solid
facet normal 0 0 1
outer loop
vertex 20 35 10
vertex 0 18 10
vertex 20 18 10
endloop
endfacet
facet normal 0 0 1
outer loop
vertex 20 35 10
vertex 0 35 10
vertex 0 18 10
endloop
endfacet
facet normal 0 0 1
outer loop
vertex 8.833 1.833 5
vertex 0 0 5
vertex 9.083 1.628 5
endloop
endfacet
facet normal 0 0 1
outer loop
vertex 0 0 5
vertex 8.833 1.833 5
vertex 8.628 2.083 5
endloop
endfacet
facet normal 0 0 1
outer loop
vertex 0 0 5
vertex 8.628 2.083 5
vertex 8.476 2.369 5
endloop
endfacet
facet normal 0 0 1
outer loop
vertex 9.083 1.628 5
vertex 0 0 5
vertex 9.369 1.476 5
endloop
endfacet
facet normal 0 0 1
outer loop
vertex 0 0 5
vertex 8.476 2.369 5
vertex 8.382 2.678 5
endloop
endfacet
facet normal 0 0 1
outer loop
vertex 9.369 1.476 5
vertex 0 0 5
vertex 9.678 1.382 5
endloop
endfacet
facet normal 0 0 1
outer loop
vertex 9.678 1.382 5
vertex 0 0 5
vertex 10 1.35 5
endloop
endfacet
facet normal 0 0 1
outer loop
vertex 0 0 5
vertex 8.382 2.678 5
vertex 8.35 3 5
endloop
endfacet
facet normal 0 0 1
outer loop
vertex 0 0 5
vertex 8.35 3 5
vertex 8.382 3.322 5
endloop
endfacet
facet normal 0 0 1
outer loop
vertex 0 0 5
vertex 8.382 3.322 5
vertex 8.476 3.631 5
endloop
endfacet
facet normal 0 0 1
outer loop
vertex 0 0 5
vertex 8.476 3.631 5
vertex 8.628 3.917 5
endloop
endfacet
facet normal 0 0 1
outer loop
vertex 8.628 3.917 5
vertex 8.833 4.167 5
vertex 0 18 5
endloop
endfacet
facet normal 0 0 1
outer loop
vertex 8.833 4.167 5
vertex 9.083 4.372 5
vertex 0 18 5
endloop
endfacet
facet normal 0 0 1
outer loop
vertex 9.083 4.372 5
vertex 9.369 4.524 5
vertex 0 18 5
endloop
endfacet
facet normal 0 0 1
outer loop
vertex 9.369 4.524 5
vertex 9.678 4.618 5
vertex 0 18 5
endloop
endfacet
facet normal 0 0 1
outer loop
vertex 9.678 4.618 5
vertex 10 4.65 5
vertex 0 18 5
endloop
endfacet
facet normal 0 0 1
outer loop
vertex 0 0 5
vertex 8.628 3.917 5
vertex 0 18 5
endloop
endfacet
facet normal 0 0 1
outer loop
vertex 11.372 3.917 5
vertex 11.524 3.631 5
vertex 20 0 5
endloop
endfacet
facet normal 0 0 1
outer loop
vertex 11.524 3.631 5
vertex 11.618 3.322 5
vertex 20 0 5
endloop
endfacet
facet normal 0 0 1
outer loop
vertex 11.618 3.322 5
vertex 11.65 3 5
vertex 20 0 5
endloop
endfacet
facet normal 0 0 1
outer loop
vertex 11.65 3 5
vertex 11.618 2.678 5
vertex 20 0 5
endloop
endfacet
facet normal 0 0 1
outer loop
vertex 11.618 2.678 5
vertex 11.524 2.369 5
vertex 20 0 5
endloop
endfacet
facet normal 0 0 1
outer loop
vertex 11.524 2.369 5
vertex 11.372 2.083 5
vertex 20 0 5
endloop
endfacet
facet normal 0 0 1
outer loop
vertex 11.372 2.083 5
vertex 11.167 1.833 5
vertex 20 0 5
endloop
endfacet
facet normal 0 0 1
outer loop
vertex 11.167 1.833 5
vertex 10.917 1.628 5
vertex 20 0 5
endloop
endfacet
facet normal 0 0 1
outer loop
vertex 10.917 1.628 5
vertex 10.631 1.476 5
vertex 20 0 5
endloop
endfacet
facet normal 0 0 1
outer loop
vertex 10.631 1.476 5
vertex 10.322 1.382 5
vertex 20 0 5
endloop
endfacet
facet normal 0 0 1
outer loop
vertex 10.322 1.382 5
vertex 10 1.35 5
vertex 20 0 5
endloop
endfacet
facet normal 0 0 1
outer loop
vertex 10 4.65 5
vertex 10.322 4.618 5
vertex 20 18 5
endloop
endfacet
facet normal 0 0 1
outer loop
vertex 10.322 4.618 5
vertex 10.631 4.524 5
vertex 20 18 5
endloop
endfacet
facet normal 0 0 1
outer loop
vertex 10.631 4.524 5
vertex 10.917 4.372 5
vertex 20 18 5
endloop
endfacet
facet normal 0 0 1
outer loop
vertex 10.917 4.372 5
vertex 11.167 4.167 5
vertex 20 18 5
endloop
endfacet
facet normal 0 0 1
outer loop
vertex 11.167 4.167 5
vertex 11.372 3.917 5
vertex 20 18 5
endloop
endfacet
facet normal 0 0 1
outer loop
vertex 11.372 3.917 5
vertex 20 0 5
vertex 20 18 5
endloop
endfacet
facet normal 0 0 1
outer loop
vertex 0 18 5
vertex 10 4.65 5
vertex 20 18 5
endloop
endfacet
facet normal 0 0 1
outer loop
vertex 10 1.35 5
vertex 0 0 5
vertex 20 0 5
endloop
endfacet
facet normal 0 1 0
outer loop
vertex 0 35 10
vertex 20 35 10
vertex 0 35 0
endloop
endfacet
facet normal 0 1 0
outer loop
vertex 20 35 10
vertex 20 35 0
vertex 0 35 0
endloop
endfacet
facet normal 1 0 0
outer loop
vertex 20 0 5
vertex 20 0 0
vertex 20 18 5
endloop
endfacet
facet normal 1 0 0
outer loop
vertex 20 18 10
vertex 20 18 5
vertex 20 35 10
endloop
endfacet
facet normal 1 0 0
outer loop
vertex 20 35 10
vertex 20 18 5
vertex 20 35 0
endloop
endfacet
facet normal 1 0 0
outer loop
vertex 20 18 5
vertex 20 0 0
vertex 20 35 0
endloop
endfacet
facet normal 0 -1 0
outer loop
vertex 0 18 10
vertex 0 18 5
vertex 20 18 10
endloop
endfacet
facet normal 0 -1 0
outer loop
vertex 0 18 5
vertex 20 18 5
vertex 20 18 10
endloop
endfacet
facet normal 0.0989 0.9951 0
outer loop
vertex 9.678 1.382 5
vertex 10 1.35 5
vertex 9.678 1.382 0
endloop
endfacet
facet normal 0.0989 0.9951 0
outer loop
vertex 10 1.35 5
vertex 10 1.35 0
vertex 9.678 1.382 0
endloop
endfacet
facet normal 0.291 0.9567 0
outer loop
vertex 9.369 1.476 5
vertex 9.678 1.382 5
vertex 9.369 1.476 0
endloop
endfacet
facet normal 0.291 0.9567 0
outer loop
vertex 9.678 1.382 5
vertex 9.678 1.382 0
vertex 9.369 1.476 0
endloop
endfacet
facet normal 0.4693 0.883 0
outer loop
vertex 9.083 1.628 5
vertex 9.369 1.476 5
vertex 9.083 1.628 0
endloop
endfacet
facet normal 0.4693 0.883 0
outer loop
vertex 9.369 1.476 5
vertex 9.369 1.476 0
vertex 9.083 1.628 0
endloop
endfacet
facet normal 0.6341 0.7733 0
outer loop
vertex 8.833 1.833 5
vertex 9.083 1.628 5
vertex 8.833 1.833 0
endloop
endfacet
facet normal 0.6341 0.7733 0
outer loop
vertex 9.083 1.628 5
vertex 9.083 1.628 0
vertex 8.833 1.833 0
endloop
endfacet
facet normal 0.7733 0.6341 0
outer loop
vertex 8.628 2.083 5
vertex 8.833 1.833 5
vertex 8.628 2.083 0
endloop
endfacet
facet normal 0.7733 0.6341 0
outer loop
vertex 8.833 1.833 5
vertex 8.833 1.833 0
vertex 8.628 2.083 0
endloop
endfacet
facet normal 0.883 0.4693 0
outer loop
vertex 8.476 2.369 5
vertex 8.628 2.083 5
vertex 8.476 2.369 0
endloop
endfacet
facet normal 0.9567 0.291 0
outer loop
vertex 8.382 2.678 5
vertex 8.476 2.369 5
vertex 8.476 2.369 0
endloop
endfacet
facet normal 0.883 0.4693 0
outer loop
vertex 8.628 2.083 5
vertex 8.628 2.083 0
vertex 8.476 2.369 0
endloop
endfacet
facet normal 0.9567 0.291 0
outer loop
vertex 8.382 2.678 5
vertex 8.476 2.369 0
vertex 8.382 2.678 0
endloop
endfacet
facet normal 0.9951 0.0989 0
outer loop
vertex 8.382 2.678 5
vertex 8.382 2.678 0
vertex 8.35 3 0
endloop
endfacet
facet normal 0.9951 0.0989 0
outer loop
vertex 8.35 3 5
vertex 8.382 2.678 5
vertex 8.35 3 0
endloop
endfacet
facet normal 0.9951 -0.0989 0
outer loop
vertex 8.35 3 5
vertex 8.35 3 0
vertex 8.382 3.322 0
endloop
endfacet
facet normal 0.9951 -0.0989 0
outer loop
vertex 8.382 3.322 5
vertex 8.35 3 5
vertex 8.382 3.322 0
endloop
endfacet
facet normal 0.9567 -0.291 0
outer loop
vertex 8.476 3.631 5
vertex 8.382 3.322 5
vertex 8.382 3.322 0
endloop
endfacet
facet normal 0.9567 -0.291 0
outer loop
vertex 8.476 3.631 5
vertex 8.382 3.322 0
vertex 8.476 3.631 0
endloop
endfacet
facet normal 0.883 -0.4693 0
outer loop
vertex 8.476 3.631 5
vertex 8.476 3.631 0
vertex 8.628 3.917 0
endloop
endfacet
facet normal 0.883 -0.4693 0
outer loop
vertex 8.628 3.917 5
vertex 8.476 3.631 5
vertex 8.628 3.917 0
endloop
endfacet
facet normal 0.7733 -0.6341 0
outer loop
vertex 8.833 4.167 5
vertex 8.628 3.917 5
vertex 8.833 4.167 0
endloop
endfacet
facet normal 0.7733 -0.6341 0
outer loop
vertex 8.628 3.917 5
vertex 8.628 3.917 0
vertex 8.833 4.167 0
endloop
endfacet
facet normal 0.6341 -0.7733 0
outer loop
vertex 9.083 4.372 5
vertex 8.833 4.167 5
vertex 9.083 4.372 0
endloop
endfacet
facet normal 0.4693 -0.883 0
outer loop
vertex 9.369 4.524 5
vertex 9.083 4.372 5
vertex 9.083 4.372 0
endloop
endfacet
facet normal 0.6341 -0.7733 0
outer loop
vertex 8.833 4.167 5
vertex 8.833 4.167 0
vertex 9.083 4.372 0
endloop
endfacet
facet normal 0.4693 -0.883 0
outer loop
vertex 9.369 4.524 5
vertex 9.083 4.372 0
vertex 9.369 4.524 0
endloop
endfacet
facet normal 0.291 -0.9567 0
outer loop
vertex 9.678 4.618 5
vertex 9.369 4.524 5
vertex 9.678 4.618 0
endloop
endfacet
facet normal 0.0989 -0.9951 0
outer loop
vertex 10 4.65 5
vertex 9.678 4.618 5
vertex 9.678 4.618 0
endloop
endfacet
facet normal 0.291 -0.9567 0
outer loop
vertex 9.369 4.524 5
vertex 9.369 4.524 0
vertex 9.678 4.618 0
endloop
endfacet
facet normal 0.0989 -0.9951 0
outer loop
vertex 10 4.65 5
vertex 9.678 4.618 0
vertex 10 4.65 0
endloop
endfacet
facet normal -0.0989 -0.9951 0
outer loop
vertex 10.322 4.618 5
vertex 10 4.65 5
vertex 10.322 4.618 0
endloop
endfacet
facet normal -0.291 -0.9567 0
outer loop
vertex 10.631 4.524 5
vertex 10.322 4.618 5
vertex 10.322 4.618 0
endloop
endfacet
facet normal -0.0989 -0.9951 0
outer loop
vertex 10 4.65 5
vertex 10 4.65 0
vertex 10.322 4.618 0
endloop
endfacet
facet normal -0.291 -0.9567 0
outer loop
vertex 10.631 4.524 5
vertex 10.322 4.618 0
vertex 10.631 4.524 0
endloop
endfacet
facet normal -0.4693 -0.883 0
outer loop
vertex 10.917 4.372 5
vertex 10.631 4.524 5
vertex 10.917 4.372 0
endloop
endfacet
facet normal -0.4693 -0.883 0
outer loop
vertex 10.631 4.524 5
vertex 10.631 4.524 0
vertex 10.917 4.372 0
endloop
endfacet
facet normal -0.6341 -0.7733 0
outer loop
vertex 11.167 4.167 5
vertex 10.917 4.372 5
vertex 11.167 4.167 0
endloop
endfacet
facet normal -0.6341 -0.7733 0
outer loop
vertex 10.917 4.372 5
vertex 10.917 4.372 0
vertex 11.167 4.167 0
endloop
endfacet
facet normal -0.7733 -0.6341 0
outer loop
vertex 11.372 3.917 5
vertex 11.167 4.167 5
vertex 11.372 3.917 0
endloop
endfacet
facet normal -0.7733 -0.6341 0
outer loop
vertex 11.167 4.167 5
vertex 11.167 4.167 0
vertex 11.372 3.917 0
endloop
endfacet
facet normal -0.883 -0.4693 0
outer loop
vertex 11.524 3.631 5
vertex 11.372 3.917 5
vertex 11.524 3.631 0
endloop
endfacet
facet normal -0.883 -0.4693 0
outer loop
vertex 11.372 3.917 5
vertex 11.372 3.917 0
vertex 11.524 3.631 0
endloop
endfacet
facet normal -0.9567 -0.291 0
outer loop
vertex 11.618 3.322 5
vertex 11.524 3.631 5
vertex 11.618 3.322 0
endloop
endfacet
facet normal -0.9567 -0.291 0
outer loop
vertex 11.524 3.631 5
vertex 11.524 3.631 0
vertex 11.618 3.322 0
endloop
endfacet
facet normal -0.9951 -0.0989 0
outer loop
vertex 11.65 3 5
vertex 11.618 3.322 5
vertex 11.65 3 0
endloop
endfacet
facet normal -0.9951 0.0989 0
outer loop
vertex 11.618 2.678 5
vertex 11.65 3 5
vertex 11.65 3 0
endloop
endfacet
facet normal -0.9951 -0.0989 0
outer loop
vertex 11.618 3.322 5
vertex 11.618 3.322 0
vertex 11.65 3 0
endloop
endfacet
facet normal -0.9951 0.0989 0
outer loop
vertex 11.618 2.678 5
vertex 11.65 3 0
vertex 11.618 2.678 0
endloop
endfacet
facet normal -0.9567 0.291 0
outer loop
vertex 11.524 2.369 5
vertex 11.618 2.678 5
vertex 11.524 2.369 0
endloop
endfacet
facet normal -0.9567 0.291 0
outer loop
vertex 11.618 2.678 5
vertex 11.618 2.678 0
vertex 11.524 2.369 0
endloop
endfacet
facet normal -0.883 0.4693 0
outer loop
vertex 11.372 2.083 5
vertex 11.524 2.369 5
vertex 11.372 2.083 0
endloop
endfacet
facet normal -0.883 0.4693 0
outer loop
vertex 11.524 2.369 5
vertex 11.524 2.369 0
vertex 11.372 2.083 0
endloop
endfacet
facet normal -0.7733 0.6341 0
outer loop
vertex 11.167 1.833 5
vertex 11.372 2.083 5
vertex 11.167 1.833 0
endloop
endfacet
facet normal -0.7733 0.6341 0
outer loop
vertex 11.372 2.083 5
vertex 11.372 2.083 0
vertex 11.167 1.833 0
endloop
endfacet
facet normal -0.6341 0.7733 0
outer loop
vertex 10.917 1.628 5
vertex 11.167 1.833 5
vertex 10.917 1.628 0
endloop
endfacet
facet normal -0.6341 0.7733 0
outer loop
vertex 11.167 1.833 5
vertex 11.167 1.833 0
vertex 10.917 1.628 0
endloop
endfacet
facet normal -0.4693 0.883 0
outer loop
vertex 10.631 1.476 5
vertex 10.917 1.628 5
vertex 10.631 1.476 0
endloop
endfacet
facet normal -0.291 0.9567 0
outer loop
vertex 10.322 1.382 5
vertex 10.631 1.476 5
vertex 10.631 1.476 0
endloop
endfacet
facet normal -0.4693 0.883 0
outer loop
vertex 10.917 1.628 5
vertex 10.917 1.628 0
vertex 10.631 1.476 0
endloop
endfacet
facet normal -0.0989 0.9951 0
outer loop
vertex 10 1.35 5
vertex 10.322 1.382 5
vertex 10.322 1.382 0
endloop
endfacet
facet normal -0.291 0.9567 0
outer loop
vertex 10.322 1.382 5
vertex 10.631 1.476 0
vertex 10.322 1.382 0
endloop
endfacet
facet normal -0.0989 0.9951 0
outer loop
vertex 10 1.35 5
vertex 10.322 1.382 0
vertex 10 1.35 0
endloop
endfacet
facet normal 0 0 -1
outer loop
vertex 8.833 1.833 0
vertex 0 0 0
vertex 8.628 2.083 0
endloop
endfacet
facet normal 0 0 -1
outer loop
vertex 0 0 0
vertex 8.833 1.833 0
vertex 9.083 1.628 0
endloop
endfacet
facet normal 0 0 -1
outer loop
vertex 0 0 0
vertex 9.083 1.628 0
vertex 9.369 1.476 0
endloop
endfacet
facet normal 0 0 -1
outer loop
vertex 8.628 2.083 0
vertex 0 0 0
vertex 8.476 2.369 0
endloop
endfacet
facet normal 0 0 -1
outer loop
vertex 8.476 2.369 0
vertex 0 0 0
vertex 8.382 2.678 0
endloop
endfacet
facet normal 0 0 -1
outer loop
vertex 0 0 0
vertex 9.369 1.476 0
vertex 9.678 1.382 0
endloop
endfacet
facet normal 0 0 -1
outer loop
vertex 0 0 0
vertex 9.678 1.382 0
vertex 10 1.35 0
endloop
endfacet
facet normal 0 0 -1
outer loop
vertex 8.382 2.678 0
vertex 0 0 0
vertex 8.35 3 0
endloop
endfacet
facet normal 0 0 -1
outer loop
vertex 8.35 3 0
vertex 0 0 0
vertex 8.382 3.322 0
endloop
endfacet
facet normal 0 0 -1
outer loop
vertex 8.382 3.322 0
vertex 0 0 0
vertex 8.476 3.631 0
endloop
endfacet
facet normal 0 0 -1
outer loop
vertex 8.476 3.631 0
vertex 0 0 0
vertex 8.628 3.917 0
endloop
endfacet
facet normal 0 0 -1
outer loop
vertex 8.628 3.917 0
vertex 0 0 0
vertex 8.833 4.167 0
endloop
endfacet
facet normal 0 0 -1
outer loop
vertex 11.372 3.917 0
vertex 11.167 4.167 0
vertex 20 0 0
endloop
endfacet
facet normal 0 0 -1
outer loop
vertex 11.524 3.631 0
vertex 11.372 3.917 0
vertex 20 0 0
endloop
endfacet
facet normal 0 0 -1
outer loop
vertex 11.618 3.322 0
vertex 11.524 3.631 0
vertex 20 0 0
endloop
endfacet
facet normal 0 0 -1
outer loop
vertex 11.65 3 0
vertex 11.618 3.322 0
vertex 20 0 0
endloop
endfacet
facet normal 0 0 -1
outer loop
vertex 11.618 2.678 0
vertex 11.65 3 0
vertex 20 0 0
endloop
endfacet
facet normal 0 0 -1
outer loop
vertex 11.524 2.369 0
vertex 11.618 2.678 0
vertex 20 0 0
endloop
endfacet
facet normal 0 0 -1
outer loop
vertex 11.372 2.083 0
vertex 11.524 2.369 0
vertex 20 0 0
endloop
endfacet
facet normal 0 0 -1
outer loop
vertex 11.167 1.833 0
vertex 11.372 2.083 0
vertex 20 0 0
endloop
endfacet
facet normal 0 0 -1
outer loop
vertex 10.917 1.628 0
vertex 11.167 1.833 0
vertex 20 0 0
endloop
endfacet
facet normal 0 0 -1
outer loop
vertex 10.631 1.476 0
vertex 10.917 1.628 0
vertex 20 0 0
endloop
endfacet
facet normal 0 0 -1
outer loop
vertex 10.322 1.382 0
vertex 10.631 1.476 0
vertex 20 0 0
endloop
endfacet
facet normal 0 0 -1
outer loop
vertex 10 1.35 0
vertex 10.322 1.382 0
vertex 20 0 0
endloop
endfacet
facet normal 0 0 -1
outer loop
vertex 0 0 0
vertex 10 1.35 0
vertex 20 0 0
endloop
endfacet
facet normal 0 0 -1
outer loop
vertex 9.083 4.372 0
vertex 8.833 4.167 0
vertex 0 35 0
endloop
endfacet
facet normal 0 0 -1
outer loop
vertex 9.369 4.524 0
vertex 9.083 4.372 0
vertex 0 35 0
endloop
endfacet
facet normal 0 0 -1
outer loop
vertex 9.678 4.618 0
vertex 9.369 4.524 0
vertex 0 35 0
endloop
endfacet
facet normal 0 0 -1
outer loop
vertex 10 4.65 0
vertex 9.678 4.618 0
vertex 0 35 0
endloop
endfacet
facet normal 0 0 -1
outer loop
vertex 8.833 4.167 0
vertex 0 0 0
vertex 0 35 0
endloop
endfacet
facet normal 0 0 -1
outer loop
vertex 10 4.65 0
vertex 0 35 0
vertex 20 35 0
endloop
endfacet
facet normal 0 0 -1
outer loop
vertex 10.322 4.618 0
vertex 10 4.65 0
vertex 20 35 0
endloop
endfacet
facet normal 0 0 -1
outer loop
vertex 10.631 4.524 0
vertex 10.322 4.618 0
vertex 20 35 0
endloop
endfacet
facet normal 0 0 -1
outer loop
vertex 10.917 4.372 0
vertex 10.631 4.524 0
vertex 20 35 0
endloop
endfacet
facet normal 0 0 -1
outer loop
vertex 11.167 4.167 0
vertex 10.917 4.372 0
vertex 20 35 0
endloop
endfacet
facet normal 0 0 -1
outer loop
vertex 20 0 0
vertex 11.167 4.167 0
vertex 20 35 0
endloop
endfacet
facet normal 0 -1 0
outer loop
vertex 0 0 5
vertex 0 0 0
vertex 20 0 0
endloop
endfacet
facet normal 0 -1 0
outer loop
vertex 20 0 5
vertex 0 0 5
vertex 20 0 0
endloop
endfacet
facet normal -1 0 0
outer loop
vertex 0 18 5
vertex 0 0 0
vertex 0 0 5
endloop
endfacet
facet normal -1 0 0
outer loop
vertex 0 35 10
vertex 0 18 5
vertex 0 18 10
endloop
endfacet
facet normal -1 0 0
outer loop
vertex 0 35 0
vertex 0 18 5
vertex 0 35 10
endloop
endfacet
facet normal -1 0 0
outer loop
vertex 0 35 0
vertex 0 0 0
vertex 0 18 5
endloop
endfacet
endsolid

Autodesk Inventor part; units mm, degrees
ref_plane "YZ Plane" through (0, 0, 0) normal (1, 0, 0) x (0, 1, 0)
ref_plane "XZ Plane" through (0, 0, 0) normal (0, 1, 0) x (-1, 0, 0)
ref_plane "XY Plane" through (0, 0, 0) normal (0, 0, 1) x (1, 0, 0)
sketch "Skizze1" plane through (0, 0, 0) normal (0, 0, 1) x (1, 0, 0)
  line L0 (-4, 0) -> (24, 0) projected
  line L1 (0, -7) -> (0, 42) projected
  line L2 (0, 0) -> (20, 0)
  line L3 (20, 0) -> (20, 35)
  line L4 (20, 35) -> (0, 35)
  line L5 (0, 35) -> (0, 0)
  dimension "d0" = 35
  dimension "d1" = 20
extrude "Extrusion1" add sketch "Skizze1" along normal blind 10
sketch "Skizze2" plane through (0, 0, 10) normal (0, 0, 1) x (1, 0, 0)
  line L0 (0, 0) -> (20, 0) projected
  line L1 (20, 0) -> (20, 35) projected
  point P0 (10, 3)
  dimension "d4" = 10
  dimension "d5" = 3
hole "Bohrung1" at (10, 3, 10) direction (0, 0, -1) diameter 3.3 end through all
sketch "Skizze3" plane through (20, 0, 0) normal (1, 0, 0) x (0, 0, -1)
  line L0 (-10, 0) -> (-5, 0)
  line L1 (-5, 0) -> (-5, 18)
  line L2 (-5, 18) -> (-10, 18)
  line L3 (-10, 18) -> (-10, 0)
  dimension "d13" = 5
  dimension "d14" = 18
extrude "Extrusion2" cut sketch "Skizze3" against normal through all
properties part number "Platine" material "Edelstahl"
